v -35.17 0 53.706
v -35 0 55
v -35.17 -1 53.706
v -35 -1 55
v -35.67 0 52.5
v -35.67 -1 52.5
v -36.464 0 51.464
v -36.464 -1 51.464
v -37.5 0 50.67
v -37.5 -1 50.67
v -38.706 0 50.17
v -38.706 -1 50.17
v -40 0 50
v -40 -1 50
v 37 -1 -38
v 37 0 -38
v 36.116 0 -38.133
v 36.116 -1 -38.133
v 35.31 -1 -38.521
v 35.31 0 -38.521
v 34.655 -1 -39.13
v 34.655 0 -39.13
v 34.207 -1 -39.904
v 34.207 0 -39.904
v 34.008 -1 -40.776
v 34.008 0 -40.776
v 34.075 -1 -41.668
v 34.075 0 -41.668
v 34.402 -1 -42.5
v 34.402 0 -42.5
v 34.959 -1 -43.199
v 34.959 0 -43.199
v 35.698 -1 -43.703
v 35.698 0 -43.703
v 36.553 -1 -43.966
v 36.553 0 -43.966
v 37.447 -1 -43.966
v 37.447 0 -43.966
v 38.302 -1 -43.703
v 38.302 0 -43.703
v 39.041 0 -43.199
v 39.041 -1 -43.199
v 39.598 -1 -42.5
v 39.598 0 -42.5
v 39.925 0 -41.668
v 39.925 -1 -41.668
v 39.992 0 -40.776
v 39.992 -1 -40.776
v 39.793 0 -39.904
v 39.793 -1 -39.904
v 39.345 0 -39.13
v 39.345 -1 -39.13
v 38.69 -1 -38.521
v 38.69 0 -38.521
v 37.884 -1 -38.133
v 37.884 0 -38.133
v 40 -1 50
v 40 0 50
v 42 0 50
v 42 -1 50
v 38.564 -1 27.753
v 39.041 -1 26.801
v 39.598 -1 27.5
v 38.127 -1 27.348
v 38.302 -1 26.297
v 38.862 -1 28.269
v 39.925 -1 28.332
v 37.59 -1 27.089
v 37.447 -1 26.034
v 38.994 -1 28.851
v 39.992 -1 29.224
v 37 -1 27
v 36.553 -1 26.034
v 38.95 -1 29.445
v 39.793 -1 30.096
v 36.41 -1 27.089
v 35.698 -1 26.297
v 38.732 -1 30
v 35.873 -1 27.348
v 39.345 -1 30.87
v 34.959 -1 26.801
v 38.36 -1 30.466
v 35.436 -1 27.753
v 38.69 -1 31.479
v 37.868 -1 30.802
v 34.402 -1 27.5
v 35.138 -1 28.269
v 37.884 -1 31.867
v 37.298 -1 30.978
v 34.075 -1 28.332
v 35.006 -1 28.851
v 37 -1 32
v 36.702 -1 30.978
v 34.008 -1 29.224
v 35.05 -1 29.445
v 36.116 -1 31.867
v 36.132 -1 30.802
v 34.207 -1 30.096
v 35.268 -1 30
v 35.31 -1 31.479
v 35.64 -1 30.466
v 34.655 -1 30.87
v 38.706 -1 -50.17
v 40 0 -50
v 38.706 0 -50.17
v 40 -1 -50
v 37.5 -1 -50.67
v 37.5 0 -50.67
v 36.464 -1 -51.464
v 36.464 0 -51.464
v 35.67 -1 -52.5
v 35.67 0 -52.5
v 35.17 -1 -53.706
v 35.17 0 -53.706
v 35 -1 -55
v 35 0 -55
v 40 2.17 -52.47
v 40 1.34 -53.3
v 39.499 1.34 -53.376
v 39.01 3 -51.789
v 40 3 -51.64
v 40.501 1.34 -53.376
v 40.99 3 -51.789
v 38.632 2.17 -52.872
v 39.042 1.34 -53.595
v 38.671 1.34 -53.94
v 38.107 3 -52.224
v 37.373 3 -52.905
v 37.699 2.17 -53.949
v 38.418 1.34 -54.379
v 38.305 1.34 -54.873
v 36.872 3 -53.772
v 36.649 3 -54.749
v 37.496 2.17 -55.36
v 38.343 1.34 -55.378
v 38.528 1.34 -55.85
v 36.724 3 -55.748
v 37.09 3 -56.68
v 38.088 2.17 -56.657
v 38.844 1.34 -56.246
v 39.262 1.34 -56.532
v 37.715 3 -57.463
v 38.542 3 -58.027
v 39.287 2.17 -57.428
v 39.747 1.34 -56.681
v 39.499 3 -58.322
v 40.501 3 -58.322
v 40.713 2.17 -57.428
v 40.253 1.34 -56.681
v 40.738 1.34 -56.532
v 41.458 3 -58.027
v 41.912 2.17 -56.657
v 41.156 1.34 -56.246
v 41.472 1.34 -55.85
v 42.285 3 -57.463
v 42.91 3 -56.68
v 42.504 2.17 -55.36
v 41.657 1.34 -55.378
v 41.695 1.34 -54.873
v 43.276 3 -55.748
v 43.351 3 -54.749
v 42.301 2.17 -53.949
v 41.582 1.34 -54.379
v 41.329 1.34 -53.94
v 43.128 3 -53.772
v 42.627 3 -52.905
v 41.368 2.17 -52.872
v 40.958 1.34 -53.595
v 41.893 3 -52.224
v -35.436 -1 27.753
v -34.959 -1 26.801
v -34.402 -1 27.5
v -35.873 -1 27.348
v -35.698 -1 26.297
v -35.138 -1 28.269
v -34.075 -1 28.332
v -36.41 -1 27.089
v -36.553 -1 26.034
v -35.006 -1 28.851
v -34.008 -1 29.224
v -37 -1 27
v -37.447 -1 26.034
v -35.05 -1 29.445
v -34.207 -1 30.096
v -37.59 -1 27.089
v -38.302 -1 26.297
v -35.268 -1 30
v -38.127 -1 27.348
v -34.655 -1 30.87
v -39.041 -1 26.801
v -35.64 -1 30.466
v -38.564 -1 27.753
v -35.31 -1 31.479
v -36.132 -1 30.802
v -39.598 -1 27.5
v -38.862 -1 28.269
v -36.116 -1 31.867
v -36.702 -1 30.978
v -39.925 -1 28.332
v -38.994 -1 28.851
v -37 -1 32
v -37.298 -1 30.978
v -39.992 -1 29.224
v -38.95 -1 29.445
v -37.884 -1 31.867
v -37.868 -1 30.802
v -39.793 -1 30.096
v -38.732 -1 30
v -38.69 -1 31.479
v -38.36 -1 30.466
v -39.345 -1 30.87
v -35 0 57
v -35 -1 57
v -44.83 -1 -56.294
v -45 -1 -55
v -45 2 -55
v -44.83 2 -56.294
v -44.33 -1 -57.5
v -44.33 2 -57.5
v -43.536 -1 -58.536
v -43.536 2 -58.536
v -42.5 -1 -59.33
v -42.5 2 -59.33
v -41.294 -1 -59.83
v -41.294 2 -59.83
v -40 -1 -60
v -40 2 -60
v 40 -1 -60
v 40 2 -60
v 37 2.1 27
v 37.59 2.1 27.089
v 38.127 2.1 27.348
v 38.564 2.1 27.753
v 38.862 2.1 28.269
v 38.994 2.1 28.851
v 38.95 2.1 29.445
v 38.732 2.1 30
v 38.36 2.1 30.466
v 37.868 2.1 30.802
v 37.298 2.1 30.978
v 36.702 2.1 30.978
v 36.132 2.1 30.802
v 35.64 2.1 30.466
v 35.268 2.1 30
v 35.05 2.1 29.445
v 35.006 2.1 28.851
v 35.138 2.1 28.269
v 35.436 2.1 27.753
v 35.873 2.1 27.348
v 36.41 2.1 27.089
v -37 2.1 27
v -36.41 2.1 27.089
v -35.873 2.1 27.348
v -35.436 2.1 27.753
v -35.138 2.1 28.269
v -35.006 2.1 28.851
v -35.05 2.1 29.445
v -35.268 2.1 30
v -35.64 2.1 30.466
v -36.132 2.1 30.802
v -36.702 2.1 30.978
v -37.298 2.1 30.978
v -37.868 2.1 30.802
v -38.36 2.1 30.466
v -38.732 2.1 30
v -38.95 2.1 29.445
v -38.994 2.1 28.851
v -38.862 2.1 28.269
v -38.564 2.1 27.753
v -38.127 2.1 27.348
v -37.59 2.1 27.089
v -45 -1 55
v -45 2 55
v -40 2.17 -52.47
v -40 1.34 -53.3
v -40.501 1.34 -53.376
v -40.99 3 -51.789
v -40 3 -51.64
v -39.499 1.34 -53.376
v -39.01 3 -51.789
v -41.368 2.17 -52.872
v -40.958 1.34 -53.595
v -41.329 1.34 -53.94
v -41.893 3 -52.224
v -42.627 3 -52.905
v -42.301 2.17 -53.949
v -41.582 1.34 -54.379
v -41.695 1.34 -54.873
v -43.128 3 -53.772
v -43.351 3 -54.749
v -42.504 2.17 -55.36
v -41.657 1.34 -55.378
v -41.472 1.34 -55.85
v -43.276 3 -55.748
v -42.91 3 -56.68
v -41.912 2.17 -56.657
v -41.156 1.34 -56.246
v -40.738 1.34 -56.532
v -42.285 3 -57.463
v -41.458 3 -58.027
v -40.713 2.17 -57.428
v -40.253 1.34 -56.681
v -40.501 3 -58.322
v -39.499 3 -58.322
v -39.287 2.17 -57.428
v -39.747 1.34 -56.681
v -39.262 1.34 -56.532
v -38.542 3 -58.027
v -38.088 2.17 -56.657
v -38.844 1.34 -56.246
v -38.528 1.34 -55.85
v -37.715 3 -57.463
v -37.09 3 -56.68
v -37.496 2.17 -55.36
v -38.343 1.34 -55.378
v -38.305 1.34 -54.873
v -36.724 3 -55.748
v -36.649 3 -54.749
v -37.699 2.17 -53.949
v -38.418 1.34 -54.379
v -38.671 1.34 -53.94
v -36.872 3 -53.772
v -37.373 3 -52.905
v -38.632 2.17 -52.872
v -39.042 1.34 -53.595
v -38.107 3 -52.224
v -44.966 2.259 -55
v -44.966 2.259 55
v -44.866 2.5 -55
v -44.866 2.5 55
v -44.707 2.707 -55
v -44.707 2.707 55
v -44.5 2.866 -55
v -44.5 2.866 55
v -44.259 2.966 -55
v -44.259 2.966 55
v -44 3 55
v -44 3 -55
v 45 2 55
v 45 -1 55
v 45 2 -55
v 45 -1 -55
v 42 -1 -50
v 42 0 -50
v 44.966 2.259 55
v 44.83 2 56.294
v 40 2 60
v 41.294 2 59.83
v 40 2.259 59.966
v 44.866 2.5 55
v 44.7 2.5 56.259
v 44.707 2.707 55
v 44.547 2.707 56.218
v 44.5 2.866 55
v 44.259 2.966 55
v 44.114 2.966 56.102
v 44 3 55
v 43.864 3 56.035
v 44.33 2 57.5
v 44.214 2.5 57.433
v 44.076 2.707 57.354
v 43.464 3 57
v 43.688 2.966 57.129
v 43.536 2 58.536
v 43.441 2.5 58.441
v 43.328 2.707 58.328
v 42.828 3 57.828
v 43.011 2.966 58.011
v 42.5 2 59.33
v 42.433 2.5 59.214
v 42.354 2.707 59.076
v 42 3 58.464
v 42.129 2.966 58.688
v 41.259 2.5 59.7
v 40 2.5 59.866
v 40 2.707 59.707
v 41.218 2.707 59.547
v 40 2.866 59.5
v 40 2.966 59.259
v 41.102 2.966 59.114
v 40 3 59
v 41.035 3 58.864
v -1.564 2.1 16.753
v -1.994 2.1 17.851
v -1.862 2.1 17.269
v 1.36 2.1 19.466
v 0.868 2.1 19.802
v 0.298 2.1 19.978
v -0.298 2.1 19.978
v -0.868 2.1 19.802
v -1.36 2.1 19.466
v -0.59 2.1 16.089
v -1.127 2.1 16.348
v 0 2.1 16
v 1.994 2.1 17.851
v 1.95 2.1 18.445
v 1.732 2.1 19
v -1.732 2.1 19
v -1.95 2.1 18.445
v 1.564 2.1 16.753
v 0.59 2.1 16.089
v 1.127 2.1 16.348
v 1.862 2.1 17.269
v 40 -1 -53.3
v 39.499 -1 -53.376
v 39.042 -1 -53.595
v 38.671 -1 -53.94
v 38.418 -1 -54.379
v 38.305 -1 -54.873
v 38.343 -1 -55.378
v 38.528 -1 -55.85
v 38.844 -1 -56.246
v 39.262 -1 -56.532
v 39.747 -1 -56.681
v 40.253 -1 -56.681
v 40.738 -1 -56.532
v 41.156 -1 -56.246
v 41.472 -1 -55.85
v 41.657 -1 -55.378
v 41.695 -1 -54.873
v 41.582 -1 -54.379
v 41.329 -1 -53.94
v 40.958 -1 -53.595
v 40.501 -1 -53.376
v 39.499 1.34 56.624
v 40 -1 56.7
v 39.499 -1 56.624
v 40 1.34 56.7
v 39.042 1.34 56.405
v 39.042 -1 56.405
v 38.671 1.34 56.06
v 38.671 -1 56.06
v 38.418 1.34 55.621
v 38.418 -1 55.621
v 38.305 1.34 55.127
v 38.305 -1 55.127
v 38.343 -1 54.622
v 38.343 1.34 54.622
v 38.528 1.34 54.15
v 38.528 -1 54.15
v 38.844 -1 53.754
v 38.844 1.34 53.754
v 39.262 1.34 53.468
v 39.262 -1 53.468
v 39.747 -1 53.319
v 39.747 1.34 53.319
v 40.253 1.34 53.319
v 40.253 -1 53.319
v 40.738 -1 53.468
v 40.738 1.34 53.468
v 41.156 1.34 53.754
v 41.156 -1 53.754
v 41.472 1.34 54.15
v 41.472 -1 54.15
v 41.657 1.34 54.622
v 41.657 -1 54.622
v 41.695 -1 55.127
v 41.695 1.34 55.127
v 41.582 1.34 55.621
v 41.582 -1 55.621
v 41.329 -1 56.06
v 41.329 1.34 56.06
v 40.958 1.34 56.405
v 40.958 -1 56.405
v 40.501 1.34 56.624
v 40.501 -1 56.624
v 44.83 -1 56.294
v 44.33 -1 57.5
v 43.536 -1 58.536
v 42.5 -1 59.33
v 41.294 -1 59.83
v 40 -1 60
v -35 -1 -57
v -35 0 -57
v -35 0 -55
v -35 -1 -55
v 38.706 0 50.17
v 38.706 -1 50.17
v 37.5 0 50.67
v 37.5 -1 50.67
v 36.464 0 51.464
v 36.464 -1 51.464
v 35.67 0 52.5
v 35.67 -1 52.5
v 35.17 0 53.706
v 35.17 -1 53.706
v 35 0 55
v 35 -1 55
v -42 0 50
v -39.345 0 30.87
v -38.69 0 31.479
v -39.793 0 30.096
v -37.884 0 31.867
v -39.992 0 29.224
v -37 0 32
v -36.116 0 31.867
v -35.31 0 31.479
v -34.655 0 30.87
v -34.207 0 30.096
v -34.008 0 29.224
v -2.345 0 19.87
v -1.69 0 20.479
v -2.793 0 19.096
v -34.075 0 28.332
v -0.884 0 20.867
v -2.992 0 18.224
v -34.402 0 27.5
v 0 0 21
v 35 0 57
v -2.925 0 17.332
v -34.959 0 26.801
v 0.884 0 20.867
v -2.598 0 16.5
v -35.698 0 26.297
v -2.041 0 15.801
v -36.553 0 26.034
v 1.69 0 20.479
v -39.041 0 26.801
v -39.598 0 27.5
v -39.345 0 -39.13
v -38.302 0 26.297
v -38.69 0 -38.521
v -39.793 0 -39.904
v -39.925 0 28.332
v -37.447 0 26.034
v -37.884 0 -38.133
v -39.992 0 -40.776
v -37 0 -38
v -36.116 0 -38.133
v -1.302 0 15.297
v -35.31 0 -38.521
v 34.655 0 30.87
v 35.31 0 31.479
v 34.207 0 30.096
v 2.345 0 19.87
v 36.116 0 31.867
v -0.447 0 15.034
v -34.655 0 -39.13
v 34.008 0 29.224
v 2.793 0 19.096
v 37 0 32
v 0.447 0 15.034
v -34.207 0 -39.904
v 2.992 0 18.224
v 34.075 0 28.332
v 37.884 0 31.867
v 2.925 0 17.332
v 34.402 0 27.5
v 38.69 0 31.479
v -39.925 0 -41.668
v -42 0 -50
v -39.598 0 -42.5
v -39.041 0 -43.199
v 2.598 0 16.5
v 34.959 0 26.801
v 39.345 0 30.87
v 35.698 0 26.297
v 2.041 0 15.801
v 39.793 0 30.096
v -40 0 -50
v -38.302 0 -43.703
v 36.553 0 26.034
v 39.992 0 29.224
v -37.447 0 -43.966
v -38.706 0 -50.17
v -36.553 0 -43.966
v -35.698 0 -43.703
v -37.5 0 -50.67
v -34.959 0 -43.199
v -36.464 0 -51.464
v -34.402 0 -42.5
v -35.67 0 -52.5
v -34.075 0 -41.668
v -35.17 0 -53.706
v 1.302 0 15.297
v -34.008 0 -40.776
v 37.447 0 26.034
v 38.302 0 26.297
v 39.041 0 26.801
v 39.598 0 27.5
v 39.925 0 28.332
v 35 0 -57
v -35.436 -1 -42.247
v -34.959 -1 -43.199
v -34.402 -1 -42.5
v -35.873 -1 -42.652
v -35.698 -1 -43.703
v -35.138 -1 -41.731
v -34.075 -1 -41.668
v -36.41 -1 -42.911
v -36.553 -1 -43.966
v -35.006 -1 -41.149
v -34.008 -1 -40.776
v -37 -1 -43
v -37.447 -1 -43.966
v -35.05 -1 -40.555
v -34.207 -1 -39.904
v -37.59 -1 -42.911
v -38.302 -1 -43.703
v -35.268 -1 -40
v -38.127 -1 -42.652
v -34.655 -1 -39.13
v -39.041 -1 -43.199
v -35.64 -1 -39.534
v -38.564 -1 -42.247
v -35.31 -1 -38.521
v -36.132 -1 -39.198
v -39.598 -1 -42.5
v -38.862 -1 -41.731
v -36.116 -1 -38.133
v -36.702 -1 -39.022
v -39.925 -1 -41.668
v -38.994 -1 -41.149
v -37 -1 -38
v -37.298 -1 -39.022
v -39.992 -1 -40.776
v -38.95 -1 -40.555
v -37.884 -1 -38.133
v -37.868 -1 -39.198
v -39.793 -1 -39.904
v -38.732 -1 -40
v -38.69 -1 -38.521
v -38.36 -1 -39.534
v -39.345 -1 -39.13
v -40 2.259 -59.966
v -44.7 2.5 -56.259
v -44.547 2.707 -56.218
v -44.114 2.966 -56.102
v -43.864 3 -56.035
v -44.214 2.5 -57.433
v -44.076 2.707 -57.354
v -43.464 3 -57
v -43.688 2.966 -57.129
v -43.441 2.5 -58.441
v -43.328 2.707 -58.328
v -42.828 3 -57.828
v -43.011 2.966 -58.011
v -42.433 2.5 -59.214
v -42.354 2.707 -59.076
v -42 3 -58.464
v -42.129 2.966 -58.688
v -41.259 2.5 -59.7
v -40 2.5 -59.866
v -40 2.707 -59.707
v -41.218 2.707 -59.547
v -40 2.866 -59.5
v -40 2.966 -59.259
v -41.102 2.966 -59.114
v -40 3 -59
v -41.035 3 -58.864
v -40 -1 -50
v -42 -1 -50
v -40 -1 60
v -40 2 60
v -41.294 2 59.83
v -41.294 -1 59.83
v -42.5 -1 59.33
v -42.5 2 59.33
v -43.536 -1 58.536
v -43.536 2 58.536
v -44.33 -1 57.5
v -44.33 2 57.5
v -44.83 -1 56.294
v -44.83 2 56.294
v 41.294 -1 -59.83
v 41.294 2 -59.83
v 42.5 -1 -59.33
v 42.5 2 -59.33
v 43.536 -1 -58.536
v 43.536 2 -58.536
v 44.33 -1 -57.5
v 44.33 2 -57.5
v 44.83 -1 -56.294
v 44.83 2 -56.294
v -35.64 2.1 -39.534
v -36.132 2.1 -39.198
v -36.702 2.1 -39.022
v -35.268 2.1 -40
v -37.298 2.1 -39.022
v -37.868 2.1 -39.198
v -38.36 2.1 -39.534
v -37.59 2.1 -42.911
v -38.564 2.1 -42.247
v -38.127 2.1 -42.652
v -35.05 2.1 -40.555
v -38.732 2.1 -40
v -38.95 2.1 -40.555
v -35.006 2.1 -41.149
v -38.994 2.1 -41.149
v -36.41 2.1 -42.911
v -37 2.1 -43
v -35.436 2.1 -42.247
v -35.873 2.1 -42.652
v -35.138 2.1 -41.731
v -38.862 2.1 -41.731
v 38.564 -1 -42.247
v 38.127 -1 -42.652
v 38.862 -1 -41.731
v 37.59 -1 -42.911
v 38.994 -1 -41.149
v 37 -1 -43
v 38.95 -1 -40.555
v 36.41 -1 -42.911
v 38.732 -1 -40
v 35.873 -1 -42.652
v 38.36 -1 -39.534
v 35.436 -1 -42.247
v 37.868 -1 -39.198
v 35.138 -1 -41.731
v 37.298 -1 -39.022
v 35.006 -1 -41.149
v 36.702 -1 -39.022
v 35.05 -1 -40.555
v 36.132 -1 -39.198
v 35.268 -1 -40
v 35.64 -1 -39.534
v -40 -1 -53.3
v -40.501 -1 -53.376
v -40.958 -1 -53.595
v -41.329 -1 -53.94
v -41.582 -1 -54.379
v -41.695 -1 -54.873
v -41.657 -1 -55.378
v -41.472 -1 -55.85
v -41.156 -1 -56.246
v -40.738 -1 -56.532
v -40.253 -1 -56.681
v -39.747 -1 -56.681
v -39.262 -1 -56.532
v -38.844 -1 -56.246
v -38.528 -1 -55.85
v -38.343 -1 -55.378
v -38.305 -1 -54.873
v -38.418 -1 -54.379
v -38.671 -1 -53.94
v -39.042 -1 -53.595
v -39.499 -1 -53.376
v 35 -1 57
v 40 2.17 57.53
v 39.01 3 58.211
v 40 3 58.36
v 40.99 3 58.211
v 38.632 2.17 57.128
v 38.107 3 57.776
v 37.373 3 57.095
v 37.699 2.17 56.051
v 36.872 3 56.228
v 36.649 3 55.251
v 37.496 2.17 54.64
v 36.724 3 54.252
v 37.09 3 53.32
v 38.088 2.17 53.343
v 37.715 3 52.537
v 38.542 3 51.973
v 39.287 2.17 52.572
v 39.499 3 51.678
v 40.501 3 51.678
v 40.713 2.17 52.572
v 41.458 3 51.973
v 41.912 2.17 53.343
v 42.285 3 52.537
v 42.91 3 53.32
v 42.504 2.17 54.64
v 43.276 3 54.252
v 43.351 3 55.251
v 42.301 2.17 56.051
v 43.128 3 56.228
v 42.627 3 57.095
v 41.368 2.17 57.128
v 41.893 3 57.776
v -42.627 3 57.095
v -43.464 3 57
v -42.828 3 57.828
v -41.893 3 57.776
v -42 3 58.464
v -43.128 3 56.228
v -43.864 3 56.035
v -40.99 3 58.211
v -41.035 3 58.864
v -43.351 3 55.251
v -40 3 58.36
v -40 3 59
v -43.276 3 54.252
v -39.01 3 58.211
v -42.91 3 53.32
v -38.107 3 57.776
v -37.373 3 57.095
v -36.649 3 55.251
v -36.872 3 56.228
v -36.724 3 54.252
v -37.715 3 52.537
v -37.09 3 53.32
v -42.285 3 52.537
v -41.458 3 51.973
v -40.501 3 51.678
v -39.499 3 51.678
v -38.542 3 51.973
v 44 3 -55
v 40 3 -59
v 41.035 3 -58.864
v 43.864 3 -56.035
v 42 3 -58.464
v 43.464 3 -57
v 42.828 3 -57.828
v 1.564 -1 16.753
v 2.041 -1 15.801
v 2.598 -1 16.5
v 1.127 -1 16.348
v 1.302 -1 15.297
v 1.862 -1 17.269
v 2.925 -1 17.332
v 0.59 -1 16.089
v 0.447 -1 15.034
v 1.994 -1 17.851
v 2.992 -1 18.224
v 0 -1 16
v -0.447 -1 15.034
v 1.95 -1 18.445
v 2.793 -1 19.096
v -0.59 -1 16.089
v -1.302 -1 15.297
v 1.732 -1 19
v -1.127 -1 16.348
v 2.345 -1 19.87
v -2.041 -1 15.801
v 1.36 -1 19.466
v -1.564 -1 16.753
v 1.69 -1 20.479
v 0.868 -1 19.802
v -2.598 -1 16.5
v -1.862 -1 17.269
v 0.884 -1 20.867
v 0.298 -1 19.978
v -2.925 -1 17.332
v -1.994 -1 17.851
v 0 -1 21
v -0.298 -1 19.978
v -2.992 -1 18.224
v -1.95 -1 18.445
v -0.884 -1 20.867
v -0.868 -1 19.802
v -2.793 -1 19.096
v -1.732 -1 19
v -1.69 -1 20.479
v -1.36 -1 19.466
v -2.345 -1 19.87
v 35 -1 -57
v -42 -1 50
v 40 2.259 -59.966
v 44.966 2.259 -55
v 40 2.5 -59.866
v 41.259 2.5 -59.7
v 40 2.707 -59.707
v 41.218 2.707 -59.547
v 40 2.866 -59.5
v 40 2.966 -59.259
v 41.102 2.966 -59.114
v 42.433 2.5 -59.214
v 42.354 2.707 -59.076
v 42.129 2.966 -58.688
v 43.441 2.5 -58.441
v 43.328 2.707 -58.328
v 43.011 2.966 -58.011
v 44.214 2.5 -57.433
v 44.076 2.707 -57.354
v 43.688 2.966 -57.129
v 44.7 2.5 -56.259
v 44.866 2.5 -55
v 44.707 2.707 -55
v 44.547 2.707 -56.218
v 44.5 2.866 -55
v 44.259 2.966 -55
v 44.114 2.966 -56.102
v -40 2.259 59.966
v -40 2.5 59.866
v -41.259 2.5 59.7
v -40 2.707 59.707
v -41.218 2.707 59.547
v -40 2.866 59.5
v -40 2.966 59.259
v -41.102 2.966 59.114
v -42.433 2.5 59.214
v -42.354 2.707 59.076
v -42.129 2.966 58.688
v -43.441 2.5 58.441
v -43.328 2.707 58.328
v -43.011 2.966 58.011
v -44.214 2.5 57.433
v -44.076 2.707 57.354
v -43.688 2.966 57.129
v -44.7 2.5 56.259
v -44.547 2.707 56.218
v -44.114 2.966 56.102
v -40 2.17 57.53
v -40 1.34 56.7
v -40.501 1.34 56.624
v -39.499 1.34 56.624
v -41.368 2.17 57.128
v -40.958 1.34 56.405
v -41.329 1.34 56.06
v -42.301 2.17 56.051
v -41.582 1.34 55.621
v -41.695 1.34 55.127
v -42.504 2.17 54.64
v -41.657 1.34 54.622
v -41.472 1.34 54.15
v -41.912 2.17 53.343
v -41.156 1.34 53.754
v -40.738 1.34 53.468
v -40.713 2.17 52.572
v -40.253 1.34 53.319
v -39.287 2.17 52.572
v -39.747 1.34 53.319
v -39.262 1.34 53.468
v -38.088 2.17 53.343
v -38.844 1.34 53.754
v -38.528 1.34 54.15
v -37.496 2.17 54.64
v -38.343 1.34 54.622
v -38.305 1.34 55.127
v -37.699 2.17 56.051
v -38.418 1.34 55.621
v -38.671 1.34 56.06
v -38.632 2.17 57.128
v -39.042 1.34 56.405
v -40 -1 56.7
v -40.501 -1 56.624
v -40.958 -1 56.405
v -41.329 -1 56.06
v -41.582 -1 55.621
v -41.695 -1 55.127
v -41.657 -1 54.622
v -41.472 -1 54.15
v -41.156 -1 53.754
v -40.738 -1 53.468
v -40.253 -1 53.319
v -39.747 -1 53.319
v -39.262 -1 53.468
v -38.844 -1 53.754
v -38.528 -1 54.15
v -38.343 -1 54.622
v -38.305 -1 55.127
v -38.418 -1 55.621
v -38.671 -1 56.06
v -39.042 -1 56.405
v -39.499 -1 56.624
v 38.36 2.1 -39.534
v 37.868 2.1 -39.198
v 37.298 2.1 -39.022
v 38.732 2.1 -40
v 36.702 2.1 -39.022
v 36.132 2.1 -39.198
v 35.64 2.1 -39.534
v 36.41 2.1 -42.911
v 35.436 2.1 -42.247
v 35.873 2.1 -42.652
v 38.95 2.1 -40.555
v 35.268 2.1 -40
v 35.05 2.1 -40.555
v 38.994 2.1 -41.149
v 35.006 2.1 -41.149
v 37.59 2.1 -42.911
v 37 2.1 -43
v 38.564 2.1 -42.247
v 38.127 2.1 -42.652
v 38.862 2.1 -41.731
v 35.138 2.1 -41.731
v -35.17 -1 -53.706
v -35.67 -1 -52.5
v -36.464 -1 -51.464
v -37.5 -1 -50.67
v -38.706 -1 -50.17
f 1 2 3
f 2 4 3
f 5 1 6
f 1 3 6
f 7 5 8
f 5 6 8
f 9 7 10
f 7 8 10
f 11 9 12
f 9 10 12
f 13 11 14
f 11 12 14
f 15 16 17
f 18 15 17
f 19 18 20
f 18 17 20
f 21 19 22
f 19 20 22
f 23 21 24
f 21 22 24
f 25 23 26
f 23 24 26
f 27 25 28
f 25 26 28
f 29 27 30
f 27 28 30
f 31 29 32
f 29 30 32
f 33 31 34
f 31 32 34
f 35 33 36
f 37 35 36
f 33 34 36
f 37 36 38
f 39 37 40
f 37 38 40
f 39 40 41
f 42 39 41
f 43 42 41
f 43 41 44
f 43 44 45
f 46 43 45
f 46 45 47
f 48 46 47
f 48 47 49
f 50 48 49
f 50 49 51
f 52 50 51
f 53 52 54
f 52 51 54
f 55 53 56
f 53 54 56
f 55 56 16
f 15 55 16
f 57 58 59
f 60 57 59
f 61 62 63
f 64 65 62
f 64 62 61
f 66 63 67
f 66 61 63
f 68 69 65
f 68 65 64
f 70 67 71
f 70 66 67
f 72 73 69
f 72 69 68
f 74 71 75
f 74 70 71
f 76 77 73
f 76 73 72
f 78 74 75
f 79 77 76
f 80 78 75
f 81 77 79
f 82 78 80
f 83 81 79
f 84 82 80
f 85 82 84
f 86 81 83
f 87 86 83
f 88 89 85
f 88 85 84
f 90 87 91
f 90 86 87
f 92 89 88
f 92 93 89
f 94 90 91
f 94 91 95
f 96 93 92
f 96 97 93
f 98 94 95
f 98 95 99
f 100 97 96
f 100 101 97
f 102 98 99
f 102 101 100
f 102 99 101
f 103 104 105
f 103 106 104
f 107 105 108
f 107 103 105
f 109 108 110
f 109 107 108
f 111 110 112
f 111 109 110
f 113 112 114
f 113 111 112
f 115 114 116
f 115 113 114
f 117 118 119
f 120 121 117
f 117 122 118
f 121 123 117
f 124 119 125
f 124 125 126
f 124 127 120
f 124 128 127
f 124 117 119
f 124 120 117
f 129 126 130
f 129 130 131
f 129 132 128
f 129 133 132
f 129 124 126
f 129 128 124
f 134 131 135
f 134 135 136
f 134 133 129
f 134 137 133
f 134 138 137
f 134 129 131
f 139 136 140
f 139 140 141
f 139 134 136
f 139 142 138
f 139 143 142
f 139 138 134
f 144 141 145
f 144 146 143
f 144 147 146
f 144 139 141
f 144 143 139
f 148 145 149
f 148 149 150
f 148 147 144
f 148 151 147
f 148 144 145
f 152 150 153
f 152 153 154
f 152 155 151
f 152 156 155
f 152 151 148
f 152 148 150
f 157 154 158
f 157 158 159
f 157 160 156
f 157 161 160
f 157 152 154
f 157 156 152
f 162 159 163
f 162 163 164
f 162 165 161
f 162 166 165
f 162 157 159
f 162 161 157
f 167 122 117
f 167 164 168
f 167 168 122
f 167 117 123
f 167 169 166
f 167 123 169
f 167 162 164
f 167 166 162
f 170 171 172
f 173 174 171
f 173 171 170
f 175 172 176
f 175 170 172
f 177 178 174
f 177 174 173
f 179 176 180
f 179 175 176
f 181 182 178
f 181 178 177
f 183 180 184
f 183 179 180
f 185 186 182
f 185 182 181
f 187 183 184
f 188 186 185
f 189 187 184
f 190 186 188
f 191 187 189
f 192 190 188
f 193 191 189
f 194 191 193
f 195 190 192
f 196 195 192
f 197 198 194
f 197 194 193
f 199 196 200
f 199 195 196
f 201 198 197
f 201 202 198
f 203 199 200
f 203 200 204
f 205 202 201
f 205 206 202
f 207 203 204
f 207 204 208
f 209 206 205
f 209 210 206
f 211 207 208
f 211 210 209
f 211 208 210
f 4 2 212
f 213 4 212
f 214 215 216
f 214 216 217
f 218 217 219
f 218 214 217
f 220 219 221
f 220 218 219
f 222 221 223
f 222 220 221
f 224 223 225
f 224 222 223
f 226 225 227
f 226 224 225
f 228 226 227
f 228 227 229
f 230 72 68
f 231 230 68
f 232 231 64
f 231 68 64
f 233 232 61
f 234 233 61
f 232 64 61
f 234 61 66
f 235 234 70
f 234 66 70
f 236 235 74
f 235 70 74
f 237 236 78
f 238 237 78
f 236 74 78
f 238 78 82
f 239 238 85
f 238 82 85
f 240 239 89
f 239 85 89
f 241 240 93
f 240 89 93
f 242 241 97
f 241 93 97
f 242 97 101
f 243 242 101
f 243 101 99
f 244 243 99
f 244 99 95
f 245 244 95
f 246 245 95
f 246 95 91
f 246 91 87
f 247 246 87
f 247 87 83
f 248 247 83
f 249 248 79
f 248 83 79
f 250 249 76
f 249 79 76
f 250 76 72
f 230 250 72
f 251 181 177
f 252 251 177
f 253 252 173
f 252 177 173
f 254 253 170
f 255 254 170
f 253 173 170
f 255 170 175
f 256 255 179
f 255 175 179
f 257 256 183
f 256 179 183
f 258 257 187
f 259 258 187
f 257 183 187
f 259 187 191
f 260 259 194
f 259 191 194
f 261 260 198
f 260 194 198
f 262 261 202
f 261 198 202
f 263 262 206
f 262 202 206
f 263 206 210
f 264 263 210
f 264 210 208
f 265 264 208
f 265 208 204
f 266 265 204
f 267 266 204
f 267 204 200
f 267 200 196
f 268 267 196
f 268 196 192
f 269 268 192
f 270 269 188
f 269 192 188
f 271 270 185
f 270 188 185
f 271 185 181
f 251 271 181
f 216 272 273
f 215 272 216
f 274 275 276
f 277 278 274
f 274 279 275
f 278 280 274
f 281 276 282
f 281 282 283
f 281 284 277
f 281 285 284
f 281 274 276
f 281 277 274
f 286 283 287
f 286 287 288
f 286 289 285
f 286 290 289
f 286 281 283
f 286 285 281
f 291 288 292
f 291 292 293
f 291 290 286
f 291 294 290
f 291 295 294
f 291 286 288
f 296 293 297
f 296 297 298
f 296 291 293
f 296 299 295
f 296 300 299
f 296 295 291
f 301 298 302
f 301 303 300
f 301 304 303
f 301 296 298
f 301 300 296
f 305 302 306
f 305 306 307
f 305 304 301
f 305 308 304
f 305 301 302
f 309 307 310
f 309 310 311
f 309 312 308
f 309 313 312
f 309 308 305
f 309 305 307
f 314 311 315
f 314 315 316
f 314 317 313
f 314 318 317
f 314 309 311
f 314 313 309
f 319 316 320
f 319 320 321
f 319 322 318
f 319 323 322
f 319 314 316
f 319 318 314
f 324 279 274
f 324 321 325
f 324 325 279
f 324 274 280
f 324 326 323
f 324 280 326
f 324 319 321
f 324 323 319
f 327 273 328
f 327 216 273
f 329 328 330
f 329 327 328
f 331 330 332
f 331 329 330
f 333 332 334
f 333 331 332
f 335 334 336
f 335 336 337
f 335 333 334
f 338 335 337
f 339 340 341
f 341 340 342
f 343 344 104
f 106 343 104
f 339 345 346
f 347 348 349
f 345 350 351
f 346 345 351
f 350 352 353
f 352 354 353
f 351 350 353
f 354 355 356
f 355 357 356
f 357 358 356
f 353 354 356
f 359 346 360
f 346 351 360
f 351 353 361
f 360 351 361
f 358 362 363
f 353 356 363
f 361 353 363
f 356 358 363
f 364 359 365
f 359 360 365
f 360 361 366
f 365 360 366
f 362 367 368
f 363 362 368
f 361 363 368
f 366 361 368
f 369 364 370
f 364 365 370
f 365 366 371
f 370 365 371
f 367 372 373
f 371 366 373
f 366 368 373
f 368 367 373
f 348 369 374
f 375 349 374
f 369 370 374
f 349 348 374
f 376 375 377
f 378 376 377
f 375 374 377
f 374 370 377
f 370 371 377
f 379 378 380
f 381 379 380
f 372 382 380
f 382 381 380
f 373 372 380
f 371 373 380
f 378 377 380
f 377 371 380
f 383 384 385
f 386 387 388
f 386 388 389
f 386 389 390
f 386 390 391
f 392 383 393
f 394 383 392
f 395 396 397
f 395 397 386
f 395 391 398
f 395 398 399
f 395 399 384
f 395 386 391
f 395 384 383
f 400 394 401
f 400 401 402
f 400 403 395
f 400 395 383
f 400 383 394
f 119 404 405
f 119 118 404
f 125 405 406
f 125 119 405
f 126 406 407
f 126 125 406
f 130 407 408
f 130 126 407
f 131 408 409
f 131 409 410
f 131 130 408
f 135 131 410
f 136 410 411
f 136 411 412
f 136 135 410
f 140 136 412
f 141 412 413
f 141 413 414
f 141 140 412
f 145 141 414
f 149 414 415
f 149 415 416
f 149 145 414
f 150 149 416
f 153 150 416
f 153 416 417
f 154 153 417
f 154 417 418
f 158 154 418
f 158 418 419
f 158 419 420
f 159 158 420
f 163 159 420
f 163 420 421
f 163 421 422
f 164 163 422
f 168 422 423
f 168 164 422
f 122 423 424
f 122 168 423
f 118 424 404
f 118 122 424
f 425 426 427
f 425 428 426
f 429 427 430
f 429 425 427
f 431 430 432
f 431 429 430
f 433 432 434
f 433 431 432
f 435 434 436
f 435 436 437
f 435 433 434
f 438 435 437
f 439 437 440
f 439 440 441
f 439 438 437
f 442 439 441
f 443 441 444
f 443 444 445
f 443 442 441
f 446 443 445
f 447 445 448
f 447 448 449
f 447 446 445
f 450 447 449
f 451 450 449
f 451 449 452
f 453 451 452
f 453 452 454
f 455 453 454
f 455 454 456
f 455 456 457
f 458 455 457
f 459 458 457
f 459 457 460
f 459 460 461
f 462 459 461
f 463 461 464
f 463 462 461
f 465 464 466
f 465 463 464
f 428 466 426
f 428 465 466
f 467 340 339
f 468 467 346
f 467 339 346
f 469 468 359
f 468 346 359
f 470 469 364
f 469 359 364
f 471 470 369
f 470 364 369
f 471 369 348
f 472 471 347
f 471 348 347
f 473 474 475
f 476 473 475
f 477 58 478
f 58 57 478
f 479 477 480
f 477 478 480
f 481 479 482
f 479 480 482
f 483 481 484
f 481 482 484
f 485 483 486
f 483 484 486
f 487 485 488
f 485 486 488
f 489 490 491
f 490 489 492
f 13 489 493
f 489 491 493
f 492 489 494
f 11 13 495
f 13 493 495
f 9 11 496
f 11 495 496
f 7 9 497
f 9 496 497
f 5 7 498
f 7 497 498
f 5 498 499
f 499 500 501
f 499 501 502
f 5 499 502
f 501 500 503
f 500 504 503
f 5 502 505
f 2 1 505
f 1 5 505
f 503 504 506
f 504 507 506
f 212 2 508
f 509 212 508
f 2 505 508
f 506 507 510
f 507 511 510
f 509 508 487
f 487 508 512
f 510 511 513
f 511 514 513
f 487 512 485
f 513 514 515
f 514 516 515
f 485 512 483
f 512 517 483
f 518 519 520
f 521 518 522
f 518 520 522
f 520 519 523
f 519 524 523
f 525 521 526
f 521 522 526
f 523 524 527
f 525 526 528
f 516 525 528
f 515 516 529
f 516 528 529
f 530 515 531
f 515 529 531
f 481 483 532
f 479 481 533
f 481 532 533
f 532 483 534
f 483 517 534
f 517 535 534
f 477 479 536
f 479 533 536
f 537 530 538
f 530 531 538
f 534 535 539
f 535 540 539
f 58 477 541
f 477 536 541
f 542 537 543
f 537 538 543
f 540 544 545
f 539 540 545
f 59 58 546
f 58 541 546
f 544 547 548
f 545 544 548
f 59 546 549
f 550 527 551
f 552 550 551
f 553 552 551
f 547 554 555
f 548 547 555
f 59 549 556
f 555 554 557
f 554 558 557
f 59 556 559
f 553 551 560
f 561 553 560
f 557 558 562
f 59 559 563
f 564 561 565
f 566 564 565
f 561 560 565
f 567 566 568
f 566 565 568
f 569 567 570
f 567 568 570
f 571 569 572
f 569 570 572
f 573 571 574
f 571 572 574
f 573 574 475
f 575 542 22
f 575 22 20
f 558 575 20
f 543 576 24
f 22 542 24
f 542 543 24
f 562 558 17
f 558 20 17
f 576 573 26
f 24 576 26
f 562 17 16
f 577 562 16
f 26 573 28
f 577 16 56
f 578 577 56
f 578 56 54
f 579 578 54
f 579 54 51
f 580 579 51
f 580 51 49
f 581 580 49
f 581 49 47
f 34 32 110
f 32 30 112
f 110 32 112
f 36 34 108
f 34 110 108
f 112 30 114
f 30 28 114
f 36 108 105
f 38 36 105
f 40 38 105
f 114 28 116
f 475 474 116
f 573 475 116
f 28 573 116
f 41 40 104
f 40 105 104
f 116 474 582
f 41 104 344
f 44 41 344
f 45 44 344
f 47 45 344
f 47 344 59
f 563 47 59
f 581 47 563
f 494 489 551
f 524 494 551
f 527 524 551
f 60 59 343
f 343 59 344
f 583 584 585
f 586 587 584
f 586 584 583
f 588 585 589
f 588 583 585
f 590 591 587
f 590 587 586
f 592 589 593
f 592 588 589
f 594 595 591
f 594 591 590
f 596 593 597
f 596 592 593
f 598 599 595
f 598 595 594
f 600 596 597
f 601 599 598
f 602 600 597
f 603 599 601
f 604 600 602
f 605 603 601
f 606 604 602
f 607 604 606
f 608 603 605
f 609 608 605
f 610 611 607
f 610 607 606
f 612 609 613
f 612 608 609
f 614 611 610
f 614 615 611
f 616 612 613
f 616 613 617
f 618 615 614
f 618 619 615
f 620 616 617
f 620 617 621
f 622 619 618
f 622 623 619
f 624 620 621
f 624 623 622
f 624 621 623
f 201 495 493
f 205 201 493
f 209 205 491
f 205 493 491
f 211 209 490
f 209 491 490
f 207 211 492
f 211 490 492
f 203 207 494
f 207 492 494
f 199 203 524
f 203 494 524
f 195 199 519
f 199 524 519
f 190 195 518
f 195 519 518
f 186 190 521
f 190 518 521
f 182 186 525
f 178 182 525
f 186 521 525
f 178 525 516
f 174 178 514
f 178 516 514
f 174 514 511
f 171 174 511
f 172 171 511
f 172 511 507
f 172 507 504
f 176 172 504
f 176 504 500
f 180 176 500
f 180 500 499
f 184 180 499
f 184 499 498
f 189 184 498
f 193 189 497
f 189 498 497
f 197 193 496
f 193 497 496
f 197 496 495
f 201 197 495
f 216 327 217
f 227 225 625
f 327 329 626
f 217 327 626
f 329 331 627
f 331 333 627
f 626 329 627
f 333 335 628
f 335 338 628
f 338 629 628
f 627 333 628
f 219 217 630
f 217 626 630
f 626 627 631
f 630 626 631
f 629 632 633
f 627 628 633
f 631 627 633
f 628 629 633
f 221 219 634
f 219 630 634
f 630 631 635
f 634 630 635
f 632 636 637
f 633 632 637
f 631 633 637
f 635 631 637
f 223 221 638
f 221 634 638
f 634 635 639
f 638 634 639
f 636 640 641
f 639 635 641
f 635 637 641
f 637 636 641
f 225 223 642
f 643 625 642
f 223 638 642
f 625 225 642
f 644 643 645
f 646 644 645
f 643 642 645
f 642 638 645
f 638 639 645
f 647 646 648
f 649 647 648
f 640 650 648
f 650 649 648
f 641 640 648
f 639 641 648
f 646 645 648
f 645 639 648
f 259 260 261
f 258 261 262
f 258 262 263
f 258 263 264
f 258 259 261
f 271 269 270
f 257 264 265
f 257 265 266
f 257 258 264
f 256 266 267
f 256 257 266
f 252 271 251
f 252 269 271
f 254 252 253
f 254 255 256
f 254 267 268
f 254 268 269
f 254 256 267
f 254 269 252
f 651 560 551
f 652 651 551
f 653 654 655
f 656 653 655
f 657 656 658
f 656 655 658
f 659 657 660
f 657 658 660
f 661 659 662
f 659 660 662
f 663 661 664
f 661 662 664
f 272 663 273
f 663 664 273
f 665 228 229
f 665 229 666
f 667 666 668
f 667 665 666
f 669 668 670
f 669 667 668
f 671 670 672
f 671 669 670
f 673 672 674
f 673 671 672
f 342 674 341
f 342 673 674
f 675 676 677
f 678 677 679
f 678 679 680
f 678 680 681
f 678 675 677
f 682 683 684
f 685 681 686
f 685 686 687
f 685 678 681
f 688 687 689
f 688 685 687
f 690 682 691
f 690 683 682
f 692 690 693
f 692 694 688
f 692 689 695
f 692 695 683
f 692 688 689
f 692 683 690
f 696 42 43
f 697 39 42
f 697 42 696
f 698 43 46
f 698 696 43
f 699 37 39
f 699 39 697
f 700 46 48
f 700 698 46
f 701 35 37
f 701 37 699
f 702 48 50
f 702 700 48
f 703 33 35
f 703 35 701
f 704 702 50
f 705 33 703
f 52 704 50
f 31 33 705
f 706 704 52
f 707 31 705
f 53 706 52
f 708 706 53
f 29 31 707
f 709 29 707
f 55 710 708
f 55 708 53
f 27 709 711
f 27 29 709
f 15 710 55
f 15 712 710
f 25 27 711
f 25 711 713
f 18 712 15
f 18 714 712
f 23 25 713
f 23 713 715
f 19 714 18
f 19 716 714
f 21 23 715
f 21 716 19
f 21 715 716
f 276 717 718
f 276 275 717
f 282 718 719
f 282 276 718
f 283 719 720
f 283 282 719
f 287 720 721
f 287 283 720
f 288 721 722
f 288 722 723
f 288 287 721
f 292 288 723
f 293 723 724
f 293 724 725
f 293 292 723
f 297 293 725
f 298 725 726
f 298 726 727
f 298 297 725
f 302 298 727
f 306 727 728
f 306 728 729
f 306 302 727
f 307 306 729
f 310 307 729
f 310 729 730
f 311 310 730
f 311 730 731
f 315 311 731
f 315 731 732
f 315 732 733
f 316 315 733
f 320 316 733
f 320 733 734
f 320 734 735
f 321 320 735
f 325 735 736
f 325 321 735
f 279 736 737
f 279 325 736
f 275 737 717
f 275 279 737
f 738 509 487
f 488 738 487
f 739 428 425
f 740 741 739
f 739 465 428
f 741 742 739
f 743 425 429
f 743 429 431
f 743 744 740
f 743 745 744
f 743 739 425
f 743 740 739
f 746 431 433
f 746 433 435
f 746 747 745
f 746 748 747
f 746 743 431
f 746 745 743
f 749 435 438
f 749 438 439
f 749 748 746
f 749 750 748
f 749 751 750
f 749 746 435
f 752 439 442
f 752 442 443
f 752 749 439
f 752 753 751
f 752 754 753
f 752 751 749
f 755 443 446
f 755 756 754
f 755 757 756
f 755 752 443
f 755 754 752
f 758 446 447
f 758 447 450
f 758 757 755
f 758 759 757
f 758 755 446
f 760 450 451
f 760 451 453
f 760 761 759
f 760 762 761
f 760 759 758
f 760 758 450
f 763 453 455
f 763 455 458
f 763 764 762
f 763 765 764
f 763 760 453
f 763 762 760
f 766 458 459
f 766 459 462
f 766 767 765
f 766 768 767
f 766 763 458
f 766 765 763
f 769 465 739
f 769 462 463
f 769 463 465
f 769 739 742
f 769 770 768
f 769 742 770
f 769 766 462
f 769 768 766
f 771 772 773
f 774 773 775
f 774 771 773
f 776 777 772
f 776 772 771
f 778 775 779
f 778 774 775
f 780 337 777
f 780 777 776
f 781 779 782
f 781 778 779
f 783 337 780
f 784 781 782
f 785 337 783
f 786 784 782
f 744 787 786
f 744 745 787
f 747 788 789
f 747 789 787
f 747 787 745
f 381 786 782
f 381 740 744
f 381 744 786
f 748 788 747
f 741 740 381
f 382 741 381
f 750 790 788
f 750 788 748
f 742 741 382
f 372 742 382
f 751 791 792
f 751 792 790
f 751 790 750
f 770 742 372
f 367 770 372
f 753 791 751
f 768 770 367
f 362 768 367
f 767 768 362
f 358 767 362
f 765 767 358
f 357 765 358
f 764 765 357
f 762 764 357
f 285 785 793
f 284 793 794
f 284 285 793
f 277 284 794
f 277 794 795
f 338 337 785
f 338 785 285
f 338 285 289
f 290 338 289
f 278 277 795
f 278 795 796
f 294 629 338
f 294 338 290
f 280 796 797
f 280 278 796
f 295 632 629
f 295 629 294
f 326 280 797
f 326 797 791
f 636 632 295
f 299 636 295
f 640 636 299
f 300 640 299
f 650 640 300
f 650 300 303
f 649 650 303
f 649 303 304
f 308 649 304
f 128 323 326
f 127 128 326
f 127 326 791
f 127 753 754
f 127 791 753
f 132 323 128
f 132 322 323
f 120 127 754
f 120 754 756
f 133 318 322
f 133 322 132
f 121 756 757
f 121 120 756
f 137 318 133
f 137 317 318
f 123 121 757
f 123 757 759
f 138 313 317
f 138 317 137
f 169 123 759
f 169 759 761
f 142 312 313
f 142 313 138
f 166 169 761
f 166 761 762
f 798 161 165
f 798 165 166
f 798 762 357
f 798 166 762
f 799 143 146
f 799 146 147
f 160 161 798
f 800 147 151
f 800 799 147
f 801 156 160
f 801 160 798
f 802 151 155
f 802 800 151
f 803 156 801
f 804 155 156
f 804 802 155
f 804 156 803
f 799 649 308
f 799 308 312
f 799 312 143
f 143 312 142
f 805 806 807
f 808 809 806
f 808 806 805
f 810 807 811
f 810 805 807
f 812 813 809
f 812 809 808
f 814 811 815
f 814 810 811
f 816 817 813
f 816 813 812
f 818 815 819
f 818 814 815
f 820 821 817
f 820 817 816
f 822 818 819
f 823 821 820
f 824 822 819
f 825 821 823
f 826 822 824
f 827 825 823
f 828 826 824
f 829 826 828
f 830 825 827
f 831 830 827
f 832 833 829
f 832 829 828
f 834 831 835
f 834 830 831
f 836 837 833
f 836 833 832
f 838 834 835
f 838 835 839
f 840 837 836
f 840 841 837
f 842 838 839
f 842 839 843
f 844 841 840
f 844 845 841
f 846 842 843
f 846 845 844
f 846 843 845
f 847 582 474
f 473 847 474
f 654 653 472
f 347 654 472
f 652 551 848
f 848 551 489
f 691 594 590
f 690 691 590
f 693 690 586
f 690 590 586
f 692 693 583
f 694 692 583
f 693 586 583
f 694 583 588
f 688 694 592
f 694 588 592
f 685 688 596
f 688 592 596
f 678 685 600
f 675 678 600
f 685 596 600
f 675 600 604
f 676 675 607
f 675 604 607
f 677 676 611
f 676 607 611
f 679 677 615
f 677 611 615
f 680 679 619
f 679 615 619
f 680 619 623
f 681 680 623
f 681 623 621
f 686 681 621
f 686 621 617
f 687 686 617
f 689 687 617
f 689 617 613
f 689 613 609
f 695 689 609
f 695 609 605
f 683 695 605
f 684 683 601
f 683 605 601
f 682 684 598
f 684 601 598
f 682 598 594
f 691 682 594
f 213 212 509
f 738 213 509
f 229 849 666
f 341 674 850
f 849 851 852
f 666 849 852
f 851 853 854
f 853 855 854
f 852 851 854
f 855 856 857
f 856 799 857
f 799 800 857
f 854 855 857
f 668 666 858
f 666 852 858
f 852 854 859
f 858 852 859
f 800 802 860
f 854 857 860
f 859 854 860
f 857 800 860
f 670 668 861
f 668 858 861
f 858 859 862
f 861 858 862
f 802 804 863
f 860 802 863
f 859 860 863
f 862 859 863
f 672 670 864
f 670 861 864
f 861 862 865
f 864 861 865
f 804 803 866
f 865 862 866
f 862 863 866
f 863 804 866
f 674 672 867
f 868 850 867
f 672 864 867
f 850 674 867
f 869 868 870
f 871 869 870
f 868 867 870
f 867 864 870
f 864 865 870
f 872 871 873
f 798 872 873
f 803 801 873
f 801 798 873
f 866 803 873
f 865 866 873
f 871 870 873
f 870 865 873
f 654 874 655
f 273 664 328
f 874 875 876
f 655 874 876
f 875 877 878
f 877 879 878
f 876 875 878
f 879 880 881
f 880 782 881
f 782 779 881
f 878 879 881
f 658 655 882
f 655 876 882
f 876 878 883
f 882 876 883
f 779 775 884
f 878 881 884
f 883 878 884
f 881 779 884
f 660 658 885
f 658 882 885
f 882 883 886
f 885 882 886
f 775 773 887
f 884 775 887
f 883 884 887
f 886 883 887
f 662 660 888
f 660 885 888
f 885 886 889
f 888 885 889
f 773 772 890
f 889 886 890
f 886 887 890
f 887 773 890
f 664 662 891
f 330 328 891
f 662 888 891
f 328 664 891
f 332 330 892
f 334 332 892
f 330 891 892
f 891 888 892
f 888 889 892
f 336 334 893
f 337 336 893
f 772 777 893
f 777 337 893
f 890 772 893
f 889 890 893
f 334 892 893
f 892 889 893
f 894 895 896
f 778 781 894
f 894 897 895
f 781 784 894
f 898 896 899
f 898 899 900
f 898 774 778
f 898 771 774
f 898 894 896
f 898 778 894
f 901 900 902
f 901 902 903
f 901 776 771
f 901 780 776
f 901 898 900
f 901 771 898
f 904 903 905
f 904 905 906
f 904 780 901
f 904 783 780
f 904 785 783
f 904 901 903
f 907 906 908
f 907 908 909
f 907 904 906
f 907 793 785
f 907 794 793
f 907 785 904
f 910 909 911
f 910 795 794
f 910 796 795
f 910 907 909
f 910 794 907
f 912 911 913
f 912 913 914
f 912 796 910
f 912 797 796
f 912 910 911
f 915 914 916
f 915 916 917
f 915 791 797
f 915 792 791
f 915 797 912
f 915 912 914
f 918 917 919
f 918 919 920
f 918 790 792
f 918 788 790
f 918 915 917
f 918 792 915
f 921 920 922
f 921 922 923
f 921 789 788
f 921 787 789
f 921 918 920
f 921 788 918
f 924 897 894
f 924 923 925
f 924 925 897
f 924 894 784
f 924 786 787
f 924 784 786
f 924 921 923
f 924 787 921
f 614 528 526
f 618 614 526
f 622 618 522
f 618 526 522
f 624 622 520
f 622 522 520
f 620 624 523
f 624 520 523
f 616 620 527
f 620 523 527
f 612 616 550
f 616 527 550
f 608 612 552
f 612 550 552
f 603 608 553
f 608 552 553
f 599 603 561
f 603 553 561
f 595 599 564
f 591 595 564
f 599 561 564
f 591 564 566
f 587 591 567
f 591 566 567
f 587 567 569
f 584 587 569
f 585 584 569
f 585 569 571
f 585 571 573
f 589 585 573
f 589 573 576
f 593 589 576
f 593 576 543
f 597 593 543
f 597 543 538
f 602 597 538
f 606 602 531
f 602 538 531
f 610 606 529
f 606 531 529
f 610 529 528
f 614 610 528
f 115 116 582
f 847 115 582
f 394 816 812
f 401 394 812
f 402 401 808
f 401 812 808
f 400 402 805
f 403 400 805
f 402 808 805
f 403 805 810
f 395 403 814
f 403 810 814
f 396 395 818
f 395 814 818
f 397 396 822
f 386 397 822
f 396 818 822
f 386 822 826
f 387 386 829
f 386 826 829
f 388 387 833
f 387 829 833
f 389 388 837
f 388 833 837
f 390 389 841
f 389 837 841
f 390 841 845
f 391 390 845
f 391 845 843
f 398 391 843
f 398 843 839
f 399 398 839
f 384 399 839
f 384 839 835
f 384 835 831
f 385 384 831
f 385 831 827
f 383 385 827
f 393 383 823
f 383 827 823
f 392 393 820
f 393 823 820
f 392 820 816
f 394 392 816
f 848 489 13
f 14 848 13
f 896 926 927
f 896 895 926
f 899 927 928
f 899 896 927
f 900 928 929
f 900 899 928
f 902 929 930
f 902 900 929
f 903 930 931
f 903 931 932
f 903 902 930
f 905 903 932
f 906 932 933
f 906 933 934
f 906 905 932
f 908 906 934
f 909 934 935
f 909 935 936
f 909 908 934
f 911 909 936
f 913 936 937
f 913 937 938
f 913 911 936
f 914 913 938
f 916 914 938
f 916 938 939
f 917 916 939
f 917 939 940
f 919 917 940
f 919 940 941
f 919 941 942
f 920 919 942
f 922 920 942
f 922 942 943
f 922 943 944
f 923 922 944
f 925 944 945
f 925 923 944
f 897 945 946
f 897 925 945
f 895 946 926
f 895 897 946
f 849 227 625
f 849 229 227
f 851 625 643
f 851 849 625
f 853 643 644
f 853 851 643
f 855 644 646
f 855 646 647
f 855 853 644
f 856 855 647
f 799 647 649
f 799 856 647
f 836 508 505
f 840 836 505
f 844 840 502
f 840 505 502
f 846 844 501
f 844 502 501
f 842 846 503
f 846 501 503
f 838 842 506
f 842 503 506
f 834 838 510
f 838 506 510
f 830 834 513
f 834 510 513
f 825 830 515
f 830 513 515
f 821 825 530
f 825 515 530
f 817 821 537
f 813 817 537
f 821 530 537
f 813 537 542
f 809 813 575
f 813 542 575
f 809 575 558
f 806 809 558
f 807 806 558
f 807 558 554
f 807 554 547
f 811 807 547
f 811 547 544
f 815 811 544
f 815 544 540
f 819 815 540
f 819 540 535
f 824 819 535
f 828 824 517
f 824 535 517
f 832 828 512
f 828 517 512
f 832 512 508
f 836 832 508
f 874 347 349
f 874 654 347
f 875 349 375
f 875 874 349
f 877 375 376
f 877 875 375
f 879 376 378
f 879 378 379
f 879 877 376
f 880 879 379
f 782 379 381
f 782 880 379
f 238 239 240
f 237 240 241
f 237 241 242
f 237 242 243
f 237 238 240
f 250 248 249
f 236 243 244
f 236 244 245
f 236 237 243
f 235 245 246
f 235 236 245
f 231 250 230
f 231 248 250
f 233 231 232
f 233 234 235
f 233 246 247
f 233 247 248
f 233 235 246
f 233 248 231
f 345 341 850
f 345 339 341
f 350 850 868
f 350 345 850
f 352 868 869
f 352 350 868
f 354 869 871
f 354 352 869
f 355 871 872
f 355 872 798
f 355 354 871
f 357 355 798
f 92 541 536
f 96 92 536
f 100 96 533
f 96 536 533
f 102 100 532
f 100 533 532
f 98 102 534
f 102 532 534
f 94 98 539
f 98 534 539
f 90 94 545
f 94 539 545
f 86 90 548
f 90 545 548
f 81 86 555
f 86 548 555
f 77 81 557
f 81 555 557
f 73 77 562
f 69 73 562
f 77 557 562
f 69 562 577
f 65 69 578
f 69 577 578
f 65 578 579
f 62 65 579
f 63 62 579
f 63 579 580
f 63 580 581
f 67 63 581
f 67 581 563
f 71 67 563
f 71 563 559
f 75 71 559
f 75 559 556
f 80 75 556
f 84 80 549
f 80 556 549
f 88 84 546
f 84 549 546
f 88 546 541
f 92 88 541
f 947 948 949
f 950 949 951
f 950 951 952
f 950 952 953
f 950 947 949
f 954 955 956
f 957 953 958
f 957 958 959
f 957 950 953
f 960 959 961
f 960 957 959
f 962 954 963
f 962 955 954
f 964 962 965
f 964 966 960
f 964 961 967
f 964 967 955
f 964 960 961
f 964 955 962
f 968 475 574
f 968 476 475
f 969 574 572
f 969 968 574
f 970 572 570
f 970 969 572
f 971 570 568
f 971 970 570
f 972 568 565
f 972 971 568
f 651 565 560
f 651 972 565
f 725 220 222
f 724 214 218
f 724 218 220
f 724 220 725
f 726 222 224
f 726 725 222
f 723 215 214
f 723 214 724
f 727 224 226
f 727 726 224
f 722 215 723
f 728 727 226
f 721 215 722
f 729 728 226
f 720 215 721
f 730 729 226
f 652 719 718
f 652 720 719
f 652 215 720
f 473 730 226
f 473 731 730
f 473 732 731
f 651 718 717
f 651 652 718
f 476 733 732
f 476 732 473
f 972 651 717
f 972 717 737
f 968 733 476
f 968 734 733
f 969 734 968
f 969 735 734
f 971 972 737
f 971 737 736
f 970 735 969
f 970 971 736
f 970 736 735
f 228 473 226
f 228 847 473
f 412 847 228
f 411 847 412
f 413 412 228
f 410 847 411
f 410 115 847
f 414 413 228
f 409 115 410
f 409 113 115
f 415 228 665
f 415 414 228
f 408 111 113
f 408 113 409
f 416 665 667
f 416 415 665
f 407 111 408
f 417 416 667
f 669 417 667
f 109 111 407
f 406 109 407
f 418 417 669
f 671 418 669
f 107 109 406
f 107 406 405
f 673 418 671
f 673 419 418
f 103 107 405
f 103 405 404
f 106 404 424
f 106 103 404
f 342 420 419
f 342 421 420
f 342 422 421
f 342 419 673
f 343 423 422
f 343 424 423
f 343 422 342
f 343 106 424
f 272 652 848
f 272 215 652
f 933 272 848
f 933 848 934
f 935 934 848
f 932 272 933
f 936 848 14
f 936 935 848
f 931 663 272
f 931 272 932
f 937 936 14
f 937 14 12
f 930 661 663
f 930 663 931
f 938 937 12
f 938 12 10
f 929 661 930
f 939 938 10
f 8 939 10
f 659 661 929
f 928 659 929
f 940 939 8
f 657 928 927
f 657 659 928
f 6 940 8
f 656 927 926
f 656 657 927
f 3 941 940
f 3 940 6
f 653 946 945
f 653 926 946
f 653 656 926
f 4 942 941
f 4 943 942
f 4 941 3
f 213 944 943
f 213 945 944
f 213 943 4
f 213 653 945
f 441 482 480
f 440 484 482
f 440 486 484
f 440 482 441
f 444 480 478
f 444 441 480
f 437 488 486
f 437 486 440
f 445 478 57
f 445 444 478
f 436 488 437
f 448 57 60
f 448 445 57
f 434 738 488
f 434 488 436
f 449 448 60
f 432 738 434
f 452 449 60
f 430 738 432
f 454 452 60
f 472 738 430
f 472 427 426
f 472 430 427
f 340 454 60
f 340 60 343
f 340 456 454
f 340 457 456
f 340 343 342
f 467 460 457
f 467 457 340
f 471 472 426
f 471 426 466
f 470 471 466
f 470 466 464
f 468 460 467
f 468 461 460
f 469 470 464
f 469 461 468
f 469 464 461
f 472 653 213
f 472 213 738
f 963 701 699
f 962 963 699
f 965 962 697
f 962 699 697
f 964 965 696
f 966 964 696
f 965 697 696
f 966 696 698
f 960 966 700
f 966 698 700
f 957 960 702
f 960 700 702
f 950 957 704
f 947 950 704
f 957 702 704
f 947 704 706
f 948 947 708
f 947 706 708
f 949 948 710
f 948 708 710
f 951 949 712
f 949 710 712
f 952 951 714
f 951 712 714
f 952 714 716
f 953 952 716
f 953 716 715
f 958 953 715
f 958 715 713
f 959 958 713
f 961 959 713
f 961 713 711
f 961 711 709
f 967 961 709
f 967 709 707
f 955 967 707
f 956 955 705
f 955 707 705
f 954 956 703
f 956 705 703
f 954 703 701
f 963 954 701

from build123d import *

# Parameters (mm, degrees)
SKETCH_2_W                  = 90
SKETCH_2_H                  = 120
EXTRUDE_1_DEPTH             = 3
SKETCH_3_W                  = 90
SKETCH_3_H                  = 120
EXTRUDE_2_DEPTH             = 1
HOLE_WIZARD_M3_3_AT_2_COUNT = 2
HOLE_WIZARD_M3_3_AT_2_PITCH = 110
HOLE_WIZARD_M3_3_AT_3_COUNT = 2
HOLE_WIZARD_M3_3_AT_3_PITCH = 136.014705087
HOLE_WIZARD_M3_3_AT_4_COUNT = 2
HOLE_WIZARD_M3_3_AT_4_PITCH = 80
FILLET_2_R                  = 5
FILLET_3_R                  = 5
FILLET_4_R                  = 5
FILLET_5_R                  = 5
FILLET_6_R                  = 5
FILLET_7_R                  = 5
FILLET_8_R                  = 5
FILLET_9_R                  = 5
FILLET_11_R                 = 1
SKETCH_18_R                 = 3
EXTRUDE_5_DEPTH             = 1
SKETCH_19_R                 = 2
CUT_EXTRUDE_1_DEPTH         = 3.1


with BuildPart() as part:
    # 草图2 → 凸台-拉伸1 (new body)
    with BuildSketch(Plane(origin=(0, 0, 0), x_dir=(1, 0, 0), z_dir=(0, 1, 0))):
        Rectangle(SKETCH_2_W, SKETCH_2_H)
    extrude(amount=EXTRUDE_1_DEPTH)


with BuildPart() as body_2:
    # 草图3 → 凸台-拉伸2 (new body)
    with BuildSketch(Plane.XZ):
        Rectangle(SKETCH_3_W, SKETCH_3_H)
        Polygon((-42, -50), (-42, 50), (-35, 50), (-35, 57), (35, 57), (35, 50), (42, 50), (42, -50), (35, -50), (35, -57), (-35, -57), (-35, -50), align=None, mode=Mode.SUBTRACT)
    extrude(amount=EXTRUDE_2_DEPTH)


with BuildPart() as hole_wizard_m3_3_tool:
    # 草图15 → M3 六角凹锥坑螺钉的锥形沉头孔3 (revolve)
    with BuildSketch(Plane(origin=(-40, 3, 55), x_dir=(0, 0, 1), z_dir=(1, 0, 0))):
        Polygon((0, 0), (0, 4), (1.7, 4), (1.7, 1.66), (3.36, 0), align=None)
    hole_wizard_m3_3 = revolve(axis=Axis((-40, 9.35, 55), (0, -1, 0)))


with BuildPart() as part_1:
    add(part.part)

    # M3 六角凹锥坑螺钉的锥形沉头孔3: cut by hole_wizard_m3_3_tool
    add(hole_wizard_m3_3_tool.part, mode=Mode.SUBTRACT)


with BuildPart() as body_2_1:
    add(body_2.part)

    # M3 六角凹锥坑螺钉的锥形沉头孔3: cut by hole_wizard_m3_3_tool
    add(hole_wizard_m3_3_tool.part, mode=Mode.SUBTRACT)


with BuildPart() as hole_wizard_m3_3_at_2_tool:
    # M3 六角凹锥坑螺钉的锥形沉头孔3 at 2: M3 六角凹锥坑螺钉的锥形沉头孔3 ×2
    with Locations(*[(0, 0, -i * HOLE_WIZARD_M3_3_AT_2_PITCH) for i in range(1, HOLE_WIZARD_M3_3_AT_2_COUNT)]):
        add(hole_wizard_m3_3)


with BuildPart() as part_2:
    add(part_1.part)

    # M3 六角凹锥坑螺钉的锥形沉头孔3 at 2: cut by hole_wizard_m3_3_at_2_tool
    add(hole_wizard_m3_3_at_2_tool.part, mode=Mode.SUBTRACT)


with BuildPart() as body_2_2:
    add(body_2_1.part)

    # M3 六角凹锥坑螺钉的锥形沉头孔3 at 2: cut by hole_wizard_m3_3_at_2_tool
    add(hole_wizard_m3_3_at_2_tool.part, mode=Mode.SUBTRACT)


with BuildPart() as hole_wizard_m3_3_at_3_tool:
    # M3 六角凹锥坑螺钉的锥形沉头孔3 at 3: M3 六角凹锥坑螺钉的锥形沉头孔3 ×2
    with Locations(*[Vector(0.5881716976750462, 0, -0.8087360843031886) * (i * HOLE_WIZARD_M3_3_AT_3_PITCH) for i in range(1, HOLE_WIZARD_M3_3_AT_3_COUNT)]):
        add(hole_wizard_m3_3)


with BuildPart() as part_3:
    add(part_2.part)

    # M3 六角凹锥坑螺钉的锥形沉头孔3 at 3: cut by hole_wizard_m3_3_at_3_tool
    add(hole_wizard_m3_3_at_3_tool.part, mode=Mode.SUBTRACT)


with BuildPart() as body_2_3:
    add(body_2_2.part)

    # M3 六角凹锥坑螺钉的锥形沉头孔3 at 3: cut by hole_wizard_m3_3_at_3_tool
    add(hole_wizard_m3_3_at_3_tool.part, mode=Mode.SUBTRACT)


with BuildPart() as hole_wizard_m3_3_at_4_tool:
    # M3 六角凹锥坑螺钉的锥形沉头孔3 at 4: M3 六角凹锥坑螺钉的锥形沉头孔3 ×2
    with Locations(*[(i * HOLE_WIZARD_M3_3_AT_4_PITCH, 0, 0) for i in range(1, HOLE_WIZARD_M3_3_AT_4_COUNT)]):
        add(hole_wizard_m3_3)


with BuildPart() as part_4:
    add(part_3.part)

    # M3 六角凹锥坑螺钉的锥形沉头孔3 at 4: cut by hole_wizard_m3_3_at_4_tool
    add(hole_wizard_m3_3_at_4_tool.part, mode=Mode.SUBTRACT)


with BuildPart() as body_2_4:
    add(body_2_3.part)

    # M3 六角凹锥坑螺钉的锥形沉头孔3 at 4: cut by hole_wizard_m3_3_at_4_tool
    add(hole_wizard_m3_3_at_4_tool.part, mode=Mode.SUBTRACT)

    # Combine 2: union part
    add(part_4.part)

    # 圆角2
    fillet_2_edges = [body_2_4.edges().sort_by_distance(p)[0] for p in [
        (35, -0.5, -50),
    ]]
    fillet(fillet_2_edges, radius=FILLET_2_R)

    # 圆角3
    fillet_3_edges = [body_2_4.edges().sort_by_distance(p)[0] for p in [
        (-35, -0.5, -50),
    ]]
    fillet(fillet_3_edges, radius=FILLET_3_R)

    # 圆角4
    fillet_4_edges = [body_2_4.edges().sort_by_distance(p)[0] for p in [
        (35, -0.5, 50),
    ]]
    fillet(fillet_4_edges, radius=FILLET_4_R)

    # 圆角5
    fillet_5_edges = [body_2_4.edges().sort_by_distance(p)[0] for p in [
        (-35, -0.5, 50),
    ]]
    fillet(fillet_5_edges, radius=FILLET_5_R)

    # 圆角6
    fillet_6_edges = [body_2_4.edges().sort_by_distance(p)[0] for p in [
        (-45, 1, -60),
    ]]
    fillet(fillet_6_edges, radius=FILLET_6_R)

    # 圆角7
    fillet_7_edges = [body_2_4.edges().sort_by_distance(p)[0] for p in [
        (45, 1, -60),
    ]]
    fillet(fillet_7_edges, radius=FILLET_7_R)

    # 圆角8
    fillet_8_edges = [body_2_4.edges().sort_by_distance(p)[0] for p in [
        (45, 1, 60),
    ]]
    fillet(fillet_8_edges, radius=FILLET_8_R)

    # 圆角9
    fillet_9_edges = [body_2_4.edges().sort_by_distance(p)[0] for p in [
        (-45, 1, 60),
    ]]
    fillet(fillet_9_edges, radius=FILLET_9_R)

    # 圆角11
    fillet_11_edges = [body_2_4.edges().sort_by_distance(p)[0] for p in [
        (-45, 3, 0),
        (-43.535533906, 3, -58.535533906),
        (0, 3, -60),
        (43.535533906, 3, -58.535533906),
        (45, 3, 0),
        (43.535533906, 3, 58.535533906),
        (0, 3, 60),
        (-43.535533906, 3, 58.535533906),
    ]]
    fillet(fillet_11_edges, radius=FILLET_11_R)

    # 草图18 → 凸台-拉伸5 (add)
    with BuildSketch(Plane.XZ):
        with Locations(Location((-37, 29, 0), (0, 0, 90))):
            Circle(SKETCH_18_R)
        with Locations(Location((37, 29, 0), (0, 0, 90))):
            Circle(SKETCH_18_R)
        with Locations(Location((0, 18, 0), (0, 0, 90))):
            Circle(SKETCH_18_R)
        with Locations(Location((-37, -41, 0), (0, 0, 90))):
            Circle(SKETCH_18_R)
        with Locations(Location((37, -41, 0), (0, 0, 90))):
            Circle(SKETCH_18_R)
    extrude(amount=EXTRUDE_5_DEPTH)

    # 草图19 → 切除-拉伸1 (cut)
    with BuildSketch(Plane.XZ.offset(1)):
        with Locations(Location((-37, 29, 0), (0, 0, 270))):
            Circle(SKETCH_19_R)
        with Locations(Location((37, 29, 0), (0, 0, 270))):
            Circle(SKETCH_19_R)
        with Locations(Location((0, 18, 0), (0, 0, 270))):
            Circle(SKETCH_19_R)
        with Locations(Location((-37, -41, 0), (0, 0, 270))):
            Circle(SKETCH_19_R)
        with Locations(Location((37, -41, 0), (0, 0, 270))):
            Circle(SKETCH_19_R)
    extrude(amount=-CUT_EXTRUDE_1_DEPTH, mode=Mode.SUBTRACT)


solid = body_2_4.part
